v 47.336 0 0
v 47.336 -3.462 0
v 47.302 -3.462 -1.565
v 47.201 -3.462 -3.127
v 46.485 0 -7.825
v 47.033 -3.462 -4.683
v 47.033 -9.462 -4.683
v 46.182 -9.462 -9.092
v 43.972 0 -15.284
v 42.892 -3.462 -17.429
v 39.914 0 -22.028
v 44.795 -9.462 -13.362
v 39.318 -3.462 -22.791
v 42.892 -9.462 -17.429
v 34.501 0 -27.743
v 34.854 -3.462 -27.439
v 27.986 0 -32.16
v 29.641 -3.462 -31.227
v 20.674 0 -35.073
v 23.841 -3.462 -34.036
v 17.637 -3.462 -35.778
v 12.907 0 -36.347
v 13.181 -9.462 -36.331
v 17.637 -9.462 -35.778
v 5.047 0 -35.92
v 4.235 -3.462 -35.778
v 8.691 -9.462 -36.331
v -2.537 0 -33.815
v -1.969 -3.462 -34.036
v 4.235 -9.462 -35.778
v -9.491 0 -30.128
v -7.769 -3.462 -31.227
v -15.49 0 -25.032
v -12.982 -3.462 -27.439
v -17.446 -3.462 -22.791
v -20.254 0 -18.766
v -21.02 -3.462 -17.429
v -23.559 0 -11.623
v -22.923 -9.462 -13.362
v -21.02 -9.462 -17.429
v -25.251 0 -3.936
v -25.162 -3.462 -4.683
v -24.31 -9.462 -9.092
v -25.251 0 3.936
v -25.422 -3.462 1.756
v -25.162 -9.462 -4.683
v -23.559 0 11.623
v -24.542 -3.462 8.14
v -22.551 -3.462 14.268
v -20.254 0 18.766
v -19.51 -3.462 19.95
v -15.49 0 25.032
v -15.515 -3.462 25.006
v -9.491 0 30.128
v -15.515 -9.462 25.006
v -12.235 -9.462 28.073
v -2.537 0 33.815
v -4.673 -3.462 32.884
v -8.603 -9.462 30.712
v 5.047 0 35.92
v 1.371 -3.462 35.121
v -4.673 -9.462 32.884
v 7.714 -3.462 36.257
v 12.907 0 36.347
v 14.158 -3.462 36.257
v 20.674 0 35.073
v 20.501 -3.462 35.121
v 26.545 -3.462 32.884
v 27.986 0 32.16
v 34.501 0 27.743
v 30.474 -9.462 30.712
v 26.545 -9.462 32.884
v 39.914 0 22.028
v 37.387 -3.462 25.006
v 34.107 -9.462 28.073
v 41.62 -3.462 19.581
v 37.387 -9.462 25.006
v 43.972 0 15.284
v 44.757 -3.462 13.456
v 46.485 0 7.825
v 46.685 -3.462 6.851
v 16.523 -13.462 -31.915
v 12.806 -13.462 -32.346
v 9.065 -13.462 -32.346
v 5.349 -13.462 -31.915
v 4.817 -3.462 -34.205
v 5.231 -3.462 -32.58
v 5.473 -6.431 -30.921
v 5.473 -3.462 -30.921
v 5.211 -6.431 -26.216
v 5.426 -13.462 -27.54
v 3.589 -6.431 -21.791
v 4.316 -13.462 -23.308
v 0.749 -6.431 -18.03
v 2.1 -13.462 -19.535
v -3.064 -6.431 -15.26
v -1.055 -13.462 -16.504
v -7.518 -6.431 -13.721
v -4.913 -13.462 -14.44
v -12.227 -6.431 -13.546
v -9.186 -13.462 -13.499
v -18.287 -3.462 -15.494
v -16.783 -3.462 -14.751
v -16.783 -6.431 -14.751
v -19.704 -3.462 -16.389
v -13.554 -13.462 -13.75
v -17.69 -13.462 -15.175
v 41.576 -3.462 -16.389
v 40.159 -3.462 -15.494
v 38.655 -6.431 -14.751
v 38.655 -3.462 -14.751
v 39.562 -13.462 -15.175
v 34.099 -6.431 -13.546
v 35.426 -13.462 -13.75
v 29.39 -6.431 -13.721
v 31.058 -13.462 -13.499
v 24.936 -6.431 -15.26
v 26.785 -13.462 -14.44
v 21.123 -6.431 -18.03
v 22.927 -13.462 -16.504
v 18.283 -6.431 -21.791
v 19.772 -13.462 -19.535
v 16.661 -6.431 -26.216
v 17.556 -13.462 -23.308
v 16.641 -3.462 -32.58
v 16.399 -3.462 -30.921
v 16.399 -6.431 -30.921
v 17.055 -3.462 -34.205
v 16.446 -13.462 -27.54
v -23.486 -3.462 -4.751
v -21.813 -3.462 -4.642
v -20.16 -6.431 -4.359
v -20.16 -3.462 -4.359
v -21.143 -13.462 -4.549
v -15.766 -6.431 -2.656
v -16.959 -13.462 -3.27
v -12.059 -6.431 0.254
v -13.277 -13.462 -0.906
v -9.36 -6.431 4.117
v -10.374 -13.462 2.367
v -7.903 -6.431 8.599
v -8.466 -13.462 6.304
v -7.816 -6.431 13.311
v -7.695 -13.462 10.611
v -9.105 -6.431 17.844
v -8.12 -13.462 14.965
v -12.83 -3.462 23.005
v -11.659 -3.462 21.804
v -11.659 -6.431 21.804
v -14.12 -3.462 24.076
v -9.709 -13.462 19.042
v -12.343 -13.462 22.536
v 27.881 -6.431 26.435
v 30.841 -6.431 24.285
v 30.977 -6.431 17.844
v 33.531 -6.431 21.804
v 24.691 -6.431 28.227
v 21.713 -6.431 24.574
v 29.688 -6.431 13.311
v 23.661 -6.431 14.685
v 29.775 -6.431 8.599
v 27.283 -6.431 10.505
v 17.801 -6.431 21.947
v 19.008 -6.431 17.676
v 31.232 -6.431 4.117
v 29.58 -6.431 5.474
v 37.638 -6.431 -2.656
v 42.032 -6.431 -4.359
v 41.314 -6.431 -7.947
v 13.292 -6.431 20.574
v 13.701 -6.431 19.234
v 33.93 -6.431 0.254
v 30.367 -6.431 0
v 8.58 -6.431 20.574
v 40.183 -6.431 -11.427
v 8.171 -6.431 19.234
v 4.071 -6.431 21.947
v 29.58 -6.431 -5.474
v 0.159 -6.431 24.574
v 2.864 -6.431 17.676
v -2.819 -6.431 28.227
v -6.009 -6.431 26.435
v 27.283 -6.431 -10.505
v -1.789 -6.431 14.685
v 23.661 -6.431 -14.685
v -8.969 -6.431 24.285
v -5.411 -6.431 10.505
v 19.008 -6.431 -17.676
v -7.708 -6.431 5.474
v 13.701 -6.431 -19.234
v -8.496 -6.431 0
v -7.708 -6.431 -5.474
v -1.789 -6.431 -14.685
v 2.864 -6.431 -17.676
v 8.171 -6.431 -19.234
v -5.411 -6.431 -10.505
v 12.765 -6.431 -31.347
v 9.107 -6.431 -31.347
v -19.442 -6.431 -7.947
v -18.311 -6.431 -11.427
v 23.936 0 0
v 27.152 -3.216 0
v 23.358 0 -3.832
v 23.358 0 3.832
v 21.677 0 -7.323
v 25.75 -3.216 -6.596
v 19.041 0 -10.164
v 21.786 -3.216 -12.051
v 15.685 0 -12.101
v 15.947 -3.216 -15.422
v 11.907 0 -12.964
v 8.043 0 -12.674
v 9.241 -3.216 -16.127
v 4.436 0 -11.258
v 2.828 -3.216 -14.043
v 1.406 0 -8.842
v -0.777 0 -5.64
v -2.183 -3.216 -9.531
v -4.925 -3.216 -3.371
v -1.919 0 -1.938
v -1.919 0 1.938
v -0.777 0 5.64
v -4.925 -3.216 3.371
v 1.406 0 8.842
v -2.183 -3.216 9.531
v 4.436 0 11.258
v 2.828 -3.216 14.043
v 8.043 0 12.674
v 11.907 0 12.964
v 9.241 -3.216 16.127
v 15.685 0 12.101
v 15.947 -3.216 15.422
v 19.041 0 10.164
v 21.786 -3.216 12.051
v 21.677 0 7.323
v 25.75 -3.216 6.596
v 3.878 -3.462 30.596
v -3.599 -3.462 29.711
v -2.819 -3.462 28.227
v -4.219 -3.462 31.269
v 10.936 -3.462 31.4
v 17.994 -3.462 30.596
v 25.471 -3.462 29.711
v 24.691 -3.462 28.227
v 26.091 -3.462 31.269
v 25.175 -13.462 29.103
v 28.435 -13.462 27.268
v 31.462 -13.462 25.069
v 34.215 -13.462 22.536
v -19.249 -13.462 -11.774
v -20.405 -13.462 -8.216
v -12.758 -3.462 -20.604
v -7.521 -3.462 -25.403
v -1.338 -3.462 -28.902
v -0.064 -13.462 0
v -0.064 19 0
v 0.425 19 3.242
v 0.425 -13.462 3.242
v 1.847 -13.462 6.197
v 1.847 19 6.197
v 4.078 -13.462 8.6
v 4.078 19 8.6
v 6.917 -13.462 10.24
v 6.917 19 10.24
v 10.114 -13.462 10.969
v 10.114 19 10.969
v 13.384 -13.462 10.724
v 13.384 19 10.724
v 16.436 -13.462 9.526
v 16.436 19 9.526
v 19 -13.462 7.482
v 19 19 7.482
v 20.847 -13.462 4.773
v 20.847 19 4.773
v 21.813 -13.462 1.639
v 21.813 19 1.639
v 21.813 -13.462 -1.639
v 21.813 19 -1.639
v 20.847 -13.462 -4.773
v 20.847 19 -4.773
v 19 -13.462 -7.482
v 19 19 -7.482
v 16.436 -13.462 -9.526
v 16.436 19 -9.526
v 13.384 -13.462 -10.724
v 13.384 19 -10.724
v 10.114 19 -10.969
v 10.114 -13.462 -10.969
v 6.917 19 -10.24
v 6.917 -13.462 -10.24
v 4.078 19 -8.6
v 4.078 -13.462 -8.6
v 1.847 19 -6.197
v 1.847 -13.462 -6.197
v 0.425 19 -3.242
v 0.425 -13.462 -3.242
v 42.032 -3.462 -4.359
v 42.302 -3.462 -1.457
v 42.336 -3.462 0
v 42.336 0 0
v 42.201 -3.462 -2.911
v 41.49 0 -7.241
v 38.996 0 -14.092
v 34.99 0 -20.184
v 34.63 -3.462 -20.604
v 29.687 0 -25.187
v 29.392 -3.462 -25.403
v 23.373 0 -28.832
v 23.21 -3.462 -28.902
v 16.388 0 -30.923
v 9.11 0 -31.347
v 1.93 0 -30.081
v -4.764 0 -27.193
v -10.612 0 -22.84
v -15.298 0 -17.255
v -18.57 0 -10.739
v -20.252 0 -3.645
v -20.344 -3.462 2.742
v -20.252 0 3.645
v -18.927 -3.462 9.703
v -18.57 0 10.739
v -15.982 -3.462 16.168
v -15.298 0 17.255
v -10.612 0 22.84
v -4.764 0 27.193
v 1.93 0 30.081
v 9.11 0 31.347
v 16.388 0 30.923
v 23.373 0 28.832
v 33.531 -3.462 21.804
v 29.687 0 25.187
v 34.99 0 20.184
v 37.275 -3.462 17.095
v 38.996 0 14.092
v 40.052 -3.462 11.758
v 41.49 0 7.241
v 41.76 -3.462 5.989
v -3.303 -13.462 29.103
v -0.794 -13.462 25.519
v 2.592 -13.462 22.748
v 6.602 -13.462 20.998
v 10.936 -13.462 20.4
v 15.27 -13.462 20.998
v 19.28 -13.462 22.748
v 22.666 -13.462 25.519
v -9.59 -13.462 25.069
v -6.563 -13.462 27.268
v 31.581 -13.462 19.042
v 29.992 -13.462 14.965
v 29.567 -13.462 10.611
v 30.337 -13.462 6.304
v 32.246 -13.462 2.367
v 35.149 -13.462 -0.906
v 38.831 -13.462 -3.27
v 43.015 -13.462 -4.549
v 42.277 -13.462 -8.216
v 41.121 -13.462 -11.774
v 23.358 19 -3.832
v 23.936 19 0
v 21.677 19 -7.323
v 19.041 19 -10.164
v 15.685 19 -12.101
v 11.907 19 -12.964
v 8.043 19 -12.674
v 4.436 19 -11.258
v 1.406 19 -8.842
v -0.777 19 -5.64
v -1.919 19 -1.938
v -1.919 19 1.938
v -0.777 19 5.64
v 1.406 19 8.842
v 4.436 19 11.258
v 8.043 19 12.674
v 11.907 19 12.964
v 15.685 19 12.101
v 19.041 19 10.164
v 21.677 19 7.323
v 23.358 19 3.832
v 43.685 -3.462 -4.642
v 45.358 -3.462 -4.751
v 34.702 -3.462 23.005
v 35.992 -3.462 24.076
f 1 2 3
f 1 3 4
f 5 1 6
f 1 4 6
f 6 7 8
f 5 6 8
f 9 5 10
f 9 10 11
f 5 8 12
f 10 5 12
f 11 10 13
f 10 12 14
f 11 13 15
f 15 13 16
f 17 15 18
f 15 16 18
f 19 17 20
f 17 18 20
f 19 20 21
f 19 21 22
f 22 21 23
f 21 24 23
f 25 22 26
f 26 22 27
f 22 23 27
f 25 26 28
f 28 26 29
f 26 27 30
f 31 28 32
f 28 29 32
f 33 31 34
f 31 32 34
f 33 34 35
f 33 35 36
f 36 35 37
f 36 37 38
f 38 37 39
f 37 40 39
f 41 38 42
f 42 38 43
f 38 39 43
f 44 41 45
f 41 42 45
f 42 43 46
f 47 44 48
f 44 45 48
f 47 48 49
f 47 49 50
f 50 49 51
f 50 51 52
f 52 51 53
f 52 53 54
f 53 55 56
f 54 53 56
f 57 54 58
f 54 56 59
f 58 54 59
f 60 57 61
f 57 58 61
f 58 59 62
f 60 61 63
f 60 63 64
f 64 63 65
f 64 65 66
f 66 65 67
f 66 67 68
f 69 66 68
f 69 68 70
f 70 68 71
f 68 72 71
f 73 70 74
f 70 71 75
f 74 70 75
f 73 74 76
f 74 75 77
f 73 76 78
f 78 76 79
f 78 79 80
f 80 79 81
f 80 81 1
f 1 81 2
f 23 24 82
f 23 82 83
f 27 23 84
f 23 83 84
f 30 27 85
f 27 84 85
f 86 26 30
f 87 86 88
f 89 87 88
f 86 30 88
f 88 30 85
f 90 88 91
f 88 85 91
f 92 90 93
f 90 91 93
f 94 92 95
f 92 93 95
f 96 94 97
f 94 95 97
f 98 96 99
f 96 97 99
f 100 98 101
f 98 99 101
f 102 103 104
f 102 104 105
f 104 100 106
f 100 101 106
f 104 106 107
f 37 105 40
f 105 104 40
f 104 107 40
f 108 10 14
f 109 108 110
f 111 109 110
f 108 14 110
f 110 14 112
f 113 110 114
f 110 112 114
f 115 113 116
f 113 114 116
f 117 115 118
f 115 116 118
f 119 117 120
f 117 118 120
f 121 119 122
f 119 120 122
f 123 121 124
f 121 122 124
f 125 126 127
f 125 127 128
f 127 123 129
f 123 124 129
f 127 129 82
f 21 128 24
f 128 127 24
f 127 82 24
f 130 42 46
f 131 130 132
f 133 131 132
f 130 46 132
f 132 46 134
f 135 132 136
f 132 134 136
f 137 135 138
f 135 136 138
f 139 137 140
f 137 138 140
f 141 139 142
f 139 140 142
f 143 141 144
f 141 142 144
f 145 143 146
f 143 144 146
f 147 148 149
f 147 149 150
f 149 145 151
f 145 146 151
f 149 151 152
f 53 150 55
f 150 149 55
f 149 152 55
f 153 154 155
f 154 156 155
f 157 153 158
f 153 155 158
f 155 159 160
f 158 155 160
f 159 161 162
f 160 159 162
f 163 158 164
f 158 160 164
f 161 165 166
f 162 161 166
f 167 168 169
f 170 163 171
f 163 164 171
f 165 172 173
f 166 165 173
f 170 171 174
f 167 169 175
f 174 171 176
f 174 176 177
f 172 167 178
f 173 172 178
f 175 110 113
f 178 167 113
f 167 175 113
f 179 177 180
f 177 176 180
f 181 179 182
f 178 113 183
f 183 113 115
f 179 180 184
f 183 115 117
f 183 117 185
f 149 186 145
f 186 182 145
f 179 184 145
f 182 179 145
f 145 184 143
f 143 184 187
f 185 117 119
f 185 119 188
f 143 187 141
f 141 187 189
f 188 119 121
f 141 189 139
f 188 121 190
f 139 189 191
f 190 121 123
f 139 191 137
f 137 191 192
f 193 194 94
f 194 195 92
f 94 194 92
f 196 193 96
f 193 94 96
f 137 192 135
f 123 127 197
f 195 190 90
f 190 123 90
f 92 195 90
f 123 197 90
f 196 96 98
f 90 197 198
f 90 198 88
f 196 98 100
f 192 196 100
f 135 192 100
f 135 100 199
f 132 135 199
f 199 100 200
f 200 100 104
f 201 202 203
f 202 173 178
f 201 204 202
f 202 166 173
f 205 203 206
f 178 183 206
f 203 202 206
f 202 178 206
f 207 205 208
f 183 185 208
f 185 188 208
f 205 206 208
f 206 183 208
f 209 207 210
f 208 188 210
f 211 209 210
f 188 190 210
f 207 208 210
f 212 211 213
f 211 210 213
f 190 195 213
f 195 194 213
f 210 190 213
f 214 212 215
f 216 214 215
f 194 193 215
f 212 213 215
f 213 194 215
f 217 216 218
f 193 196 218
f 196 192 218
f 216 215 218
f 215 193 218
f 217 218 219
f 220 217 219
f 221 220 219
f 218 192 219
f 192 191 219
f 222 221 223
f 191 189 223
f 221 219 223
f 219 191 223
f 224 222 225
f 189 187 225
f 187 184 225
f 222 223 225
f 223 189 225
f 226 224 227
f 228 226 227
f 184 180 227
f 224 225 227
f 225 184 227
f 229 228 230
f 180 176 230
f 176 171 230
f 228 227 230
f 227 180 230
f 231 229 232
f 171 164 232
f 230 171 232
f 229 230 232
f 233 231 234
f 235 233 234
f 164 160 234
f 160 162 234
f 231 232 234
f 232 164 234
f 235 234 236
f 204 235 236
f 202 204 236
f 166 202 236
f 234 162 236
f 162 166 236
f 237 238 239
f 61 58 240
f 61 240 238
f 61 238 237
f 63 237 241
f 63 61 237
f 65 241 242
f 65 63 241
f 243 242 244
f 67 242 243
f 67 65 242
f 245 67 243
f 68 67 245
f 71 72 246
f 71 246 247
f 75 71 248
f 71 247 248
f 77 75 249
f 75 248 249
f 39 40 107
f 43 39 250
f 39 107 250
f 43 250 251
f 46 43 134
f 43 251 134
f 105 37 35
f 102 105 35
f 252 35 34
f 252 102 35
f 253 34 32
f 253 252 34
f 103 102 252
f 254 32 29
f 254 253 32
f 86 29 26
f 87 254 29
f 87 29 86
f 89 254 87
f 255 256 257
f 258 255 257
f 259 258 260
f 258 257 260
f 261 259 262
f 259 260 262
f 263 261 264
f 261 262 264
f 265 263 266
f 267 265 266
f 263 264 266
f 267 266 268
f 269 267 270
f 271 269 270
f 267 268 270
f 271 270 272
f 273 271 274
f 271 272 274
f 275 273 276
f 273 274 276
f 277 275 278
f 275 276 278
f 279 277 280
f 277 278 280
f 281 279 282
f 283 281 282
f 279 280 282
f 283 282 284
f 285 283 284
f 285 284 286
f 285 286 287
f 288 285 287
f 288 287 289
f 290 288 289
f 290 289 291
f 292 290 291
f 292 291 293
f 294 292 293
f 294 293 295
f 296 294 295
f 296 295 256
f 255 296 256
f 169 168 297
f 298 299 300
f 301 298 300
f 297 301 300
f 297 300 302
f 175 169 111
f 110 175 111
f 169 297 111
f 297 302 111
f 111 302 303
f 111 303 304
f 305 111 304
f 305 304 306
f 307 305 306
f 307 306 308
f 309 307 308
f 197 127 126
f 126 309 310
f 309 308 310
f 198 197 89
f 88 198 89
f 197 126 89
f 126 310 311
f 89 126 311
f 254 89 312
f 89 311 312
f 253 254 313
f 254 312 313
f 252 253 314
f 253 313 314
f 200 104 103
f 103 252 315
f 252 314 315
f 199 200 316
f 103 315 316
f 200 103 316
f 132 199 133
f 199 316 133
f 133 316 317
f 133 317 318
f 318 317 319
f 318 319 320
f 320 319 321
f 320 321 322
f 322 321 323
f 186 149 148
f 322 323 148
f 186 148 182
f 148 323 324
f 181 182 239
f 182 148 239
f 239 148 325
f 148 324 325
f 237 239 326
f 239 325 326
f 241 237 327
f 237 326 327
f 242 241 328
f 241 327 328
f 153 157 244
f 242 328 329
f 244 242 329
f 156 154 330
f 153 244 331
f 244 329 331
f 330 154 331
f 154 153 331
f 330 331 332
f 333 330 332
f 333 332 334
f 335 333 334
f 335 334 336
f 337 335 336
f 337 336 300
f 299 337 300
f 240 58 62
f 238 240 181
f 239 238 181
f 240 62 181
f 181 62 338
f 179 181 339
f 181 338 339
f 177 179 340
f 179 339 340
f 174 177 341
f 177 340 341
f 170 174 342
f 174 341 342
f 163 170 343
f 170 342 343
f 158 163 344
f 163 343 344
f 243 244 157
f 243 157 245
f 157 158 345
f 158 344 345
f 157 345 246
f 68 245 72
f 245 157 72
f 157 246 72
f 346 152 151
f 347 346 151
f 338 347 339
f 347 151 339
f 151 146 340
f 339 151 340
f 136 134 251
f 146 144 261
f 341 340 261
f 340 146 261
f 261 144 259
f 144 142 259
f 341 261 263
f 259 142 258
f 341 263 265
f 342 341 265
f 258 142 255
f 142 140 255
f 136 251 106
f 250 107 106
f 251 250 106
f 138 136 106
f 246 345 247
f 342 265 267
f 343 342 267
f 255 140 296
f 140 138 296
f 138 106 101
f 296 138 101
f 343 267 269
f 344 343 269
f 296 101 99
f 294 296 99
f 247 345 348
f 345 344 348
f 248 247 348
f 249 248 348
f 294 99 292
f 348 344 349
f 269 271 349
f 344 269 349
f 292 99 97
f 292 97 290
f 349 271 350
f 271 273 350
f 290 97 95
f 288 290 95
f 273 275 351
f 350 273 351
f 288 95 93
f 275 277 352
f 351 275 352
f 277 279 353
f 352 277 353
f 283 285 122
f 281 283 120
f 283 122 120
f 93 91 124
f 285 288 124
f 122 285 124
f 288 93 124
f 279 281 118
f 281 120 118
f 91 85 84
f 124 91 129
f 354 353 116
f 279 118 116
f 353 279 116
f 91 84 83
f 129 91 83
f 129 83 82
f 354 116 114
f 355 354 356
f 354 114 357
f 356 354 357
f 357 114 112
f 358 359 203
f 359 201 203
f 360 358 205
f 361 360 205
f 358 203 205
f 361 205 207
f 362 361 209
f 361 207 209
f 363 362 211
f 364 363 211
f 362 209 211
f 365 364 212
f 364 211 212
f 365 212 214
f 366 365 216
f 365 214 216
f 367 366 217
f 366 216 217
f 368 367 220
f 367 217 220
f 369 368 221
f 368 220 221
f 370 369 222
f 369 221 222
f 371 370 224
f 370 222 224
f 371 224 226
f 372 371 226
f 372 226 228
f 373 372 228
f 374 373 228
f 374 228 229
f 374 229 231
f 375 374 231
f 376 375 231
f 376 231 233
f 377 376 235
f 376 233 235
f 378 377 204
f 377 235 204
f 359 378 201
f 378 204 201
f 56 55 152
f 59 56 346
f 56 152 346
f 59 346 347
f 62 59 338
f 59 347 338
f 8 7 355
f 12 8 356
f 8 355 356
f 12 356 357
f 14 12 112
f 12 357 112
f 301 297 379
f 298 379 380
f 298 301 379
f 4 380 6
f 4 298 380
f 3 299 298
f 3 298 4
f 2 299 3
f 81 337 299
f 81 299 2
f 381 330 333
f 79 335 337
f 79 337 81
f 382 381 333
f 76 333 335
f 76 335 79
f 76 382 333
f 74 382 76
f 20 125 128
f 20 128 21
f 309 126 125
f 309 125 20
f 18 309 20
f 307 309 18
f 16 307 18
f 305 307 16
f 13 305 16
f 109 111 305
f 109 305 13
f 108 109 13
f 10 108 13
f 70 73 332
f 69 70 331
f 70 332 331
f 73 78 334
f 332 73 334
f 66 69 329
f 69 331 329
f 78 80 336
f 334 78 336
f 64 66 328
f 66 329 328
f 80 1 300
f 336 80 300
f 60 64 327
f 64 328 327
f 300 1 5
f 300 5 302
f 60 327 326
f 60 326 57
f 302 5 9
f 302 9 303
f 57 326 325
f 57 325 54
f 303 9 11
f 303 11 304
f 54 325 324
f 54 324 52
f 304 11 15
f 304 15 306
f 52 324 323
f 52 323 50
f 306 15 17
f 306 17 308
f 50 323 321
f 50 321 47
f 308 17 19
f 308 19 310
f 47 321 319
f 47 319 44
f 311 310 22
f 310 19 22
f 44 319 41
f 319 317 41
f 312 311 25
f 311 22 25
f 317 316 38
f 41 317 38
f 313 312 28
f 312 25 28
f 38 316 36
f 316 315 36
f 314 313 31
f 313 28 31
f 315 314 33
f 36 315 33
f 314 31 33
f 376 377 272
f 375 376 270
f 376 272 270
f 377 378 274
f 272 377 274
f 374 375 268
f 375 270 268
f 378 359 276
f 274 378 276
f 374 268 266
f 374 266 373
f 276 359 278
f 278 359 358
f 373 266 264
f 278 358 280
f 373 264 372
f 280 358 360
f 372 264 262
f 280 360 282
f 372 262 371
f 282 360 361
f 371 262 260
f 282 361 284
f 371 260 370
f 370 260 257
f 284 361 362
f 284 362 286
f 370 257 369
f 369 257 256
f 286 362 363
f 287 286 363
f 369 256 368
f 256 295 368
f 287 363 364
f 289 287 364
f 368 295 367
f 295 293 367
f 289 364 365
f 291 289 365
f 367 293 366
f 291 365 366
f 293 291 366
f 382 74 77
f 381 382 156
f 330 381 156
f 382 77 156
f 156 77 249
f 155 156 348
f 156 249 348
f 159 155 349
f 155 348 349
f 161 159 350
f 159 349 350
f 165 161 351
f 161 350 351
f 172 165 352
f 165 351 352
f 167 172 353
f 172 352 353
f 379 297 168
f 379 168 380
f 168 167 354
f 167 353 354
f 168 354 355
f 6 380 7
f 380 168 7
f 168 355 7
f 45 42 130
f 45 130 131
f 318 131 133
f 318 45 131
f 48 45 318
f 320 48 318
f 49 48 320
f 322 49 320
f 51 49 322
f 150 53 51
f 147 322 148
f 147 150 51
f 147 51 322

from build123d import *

# Parameters (mm, degrees)
CUT_EXTRUDE1_REACH = 69.967
SKETCH3_R          = 11
SKETCH4_R          = 16
CUT_EXTRUDE2_DEPTH = 10


with BuildPart() as part:
    # Sketch2 → Revolve1 (revolve)
    with BuildSketch(Plane.XY, mode=Mode.PRIVATE) as revolve1_sk:
        Polygon((10.935942394, 19), (-2.064057606, 19), (-2.064057606, 0), (-8.495542791, -6.431485186), (-20.464057606, -6.431485186), (-20.464057606, 0), (-25.464057606, 0), (-25.464057606, -9.462439506), (-21.464057606, -13.462439506), (10.935942394, -13.462439506), align=None)
    revolve(revolve1_sk.sketch.rotate(Axis((10.935942394, -13.462439506, 0), (0, 1, 0)), 180), axis=Axis((10.935942394, -13.462439506, 0), (0, 1, 0)))

    # Sketch3 → Cut-Extrude1 (cut, up to next)
    with BuildSketch(Plane(origin=(0, 19, 0), x_dir=(1, 0, 0), z_dir=(0, 1, 0)), mode=Mode.PRIVATE) as cut_extrude1_sk1:
        with Locations(Location((10.935942394, 0, 0), (0, 0, 180))):
            Circle(SKETCH3_R)
    cut_extrude1_tool1 = extrude(cut_extrude1_sk1.sketch, amount=-CUT_EXTRUDE1_REACH, mode=Mode.PRIVATE) & part.part
    add(cut_extrude1_tool1.solids().sort_by_distance((10.935942, 19, 0))[0], mode=Mode.SUBTRACT)

    # Sketch4 → Cut-Extrude2 (cut)
    with BuildSketch(Plane.XZ.offset(13.462439506)):
        with Locations((10.935942394, 36.4)):
            Circle(SKETCH4_R)
        with Locations((45.554399587, 11.248218595)):
            Circle(SKETCH4_R)
        with Locations((32.331325578, -29.448218595)):
            Circle(SKETCH4_R)
        with Locations((-10.459440789, -29.448218595)):
            Circle(SKETCH4_R)
        with Locations((-23.682514799, 11.248218595)):
            Circle(SKETCH4_R)
    extrude(amount=-CUT_EXTRUDE2_DEPTH, mode=Mode.SUBTRACT)


solid = part.part
